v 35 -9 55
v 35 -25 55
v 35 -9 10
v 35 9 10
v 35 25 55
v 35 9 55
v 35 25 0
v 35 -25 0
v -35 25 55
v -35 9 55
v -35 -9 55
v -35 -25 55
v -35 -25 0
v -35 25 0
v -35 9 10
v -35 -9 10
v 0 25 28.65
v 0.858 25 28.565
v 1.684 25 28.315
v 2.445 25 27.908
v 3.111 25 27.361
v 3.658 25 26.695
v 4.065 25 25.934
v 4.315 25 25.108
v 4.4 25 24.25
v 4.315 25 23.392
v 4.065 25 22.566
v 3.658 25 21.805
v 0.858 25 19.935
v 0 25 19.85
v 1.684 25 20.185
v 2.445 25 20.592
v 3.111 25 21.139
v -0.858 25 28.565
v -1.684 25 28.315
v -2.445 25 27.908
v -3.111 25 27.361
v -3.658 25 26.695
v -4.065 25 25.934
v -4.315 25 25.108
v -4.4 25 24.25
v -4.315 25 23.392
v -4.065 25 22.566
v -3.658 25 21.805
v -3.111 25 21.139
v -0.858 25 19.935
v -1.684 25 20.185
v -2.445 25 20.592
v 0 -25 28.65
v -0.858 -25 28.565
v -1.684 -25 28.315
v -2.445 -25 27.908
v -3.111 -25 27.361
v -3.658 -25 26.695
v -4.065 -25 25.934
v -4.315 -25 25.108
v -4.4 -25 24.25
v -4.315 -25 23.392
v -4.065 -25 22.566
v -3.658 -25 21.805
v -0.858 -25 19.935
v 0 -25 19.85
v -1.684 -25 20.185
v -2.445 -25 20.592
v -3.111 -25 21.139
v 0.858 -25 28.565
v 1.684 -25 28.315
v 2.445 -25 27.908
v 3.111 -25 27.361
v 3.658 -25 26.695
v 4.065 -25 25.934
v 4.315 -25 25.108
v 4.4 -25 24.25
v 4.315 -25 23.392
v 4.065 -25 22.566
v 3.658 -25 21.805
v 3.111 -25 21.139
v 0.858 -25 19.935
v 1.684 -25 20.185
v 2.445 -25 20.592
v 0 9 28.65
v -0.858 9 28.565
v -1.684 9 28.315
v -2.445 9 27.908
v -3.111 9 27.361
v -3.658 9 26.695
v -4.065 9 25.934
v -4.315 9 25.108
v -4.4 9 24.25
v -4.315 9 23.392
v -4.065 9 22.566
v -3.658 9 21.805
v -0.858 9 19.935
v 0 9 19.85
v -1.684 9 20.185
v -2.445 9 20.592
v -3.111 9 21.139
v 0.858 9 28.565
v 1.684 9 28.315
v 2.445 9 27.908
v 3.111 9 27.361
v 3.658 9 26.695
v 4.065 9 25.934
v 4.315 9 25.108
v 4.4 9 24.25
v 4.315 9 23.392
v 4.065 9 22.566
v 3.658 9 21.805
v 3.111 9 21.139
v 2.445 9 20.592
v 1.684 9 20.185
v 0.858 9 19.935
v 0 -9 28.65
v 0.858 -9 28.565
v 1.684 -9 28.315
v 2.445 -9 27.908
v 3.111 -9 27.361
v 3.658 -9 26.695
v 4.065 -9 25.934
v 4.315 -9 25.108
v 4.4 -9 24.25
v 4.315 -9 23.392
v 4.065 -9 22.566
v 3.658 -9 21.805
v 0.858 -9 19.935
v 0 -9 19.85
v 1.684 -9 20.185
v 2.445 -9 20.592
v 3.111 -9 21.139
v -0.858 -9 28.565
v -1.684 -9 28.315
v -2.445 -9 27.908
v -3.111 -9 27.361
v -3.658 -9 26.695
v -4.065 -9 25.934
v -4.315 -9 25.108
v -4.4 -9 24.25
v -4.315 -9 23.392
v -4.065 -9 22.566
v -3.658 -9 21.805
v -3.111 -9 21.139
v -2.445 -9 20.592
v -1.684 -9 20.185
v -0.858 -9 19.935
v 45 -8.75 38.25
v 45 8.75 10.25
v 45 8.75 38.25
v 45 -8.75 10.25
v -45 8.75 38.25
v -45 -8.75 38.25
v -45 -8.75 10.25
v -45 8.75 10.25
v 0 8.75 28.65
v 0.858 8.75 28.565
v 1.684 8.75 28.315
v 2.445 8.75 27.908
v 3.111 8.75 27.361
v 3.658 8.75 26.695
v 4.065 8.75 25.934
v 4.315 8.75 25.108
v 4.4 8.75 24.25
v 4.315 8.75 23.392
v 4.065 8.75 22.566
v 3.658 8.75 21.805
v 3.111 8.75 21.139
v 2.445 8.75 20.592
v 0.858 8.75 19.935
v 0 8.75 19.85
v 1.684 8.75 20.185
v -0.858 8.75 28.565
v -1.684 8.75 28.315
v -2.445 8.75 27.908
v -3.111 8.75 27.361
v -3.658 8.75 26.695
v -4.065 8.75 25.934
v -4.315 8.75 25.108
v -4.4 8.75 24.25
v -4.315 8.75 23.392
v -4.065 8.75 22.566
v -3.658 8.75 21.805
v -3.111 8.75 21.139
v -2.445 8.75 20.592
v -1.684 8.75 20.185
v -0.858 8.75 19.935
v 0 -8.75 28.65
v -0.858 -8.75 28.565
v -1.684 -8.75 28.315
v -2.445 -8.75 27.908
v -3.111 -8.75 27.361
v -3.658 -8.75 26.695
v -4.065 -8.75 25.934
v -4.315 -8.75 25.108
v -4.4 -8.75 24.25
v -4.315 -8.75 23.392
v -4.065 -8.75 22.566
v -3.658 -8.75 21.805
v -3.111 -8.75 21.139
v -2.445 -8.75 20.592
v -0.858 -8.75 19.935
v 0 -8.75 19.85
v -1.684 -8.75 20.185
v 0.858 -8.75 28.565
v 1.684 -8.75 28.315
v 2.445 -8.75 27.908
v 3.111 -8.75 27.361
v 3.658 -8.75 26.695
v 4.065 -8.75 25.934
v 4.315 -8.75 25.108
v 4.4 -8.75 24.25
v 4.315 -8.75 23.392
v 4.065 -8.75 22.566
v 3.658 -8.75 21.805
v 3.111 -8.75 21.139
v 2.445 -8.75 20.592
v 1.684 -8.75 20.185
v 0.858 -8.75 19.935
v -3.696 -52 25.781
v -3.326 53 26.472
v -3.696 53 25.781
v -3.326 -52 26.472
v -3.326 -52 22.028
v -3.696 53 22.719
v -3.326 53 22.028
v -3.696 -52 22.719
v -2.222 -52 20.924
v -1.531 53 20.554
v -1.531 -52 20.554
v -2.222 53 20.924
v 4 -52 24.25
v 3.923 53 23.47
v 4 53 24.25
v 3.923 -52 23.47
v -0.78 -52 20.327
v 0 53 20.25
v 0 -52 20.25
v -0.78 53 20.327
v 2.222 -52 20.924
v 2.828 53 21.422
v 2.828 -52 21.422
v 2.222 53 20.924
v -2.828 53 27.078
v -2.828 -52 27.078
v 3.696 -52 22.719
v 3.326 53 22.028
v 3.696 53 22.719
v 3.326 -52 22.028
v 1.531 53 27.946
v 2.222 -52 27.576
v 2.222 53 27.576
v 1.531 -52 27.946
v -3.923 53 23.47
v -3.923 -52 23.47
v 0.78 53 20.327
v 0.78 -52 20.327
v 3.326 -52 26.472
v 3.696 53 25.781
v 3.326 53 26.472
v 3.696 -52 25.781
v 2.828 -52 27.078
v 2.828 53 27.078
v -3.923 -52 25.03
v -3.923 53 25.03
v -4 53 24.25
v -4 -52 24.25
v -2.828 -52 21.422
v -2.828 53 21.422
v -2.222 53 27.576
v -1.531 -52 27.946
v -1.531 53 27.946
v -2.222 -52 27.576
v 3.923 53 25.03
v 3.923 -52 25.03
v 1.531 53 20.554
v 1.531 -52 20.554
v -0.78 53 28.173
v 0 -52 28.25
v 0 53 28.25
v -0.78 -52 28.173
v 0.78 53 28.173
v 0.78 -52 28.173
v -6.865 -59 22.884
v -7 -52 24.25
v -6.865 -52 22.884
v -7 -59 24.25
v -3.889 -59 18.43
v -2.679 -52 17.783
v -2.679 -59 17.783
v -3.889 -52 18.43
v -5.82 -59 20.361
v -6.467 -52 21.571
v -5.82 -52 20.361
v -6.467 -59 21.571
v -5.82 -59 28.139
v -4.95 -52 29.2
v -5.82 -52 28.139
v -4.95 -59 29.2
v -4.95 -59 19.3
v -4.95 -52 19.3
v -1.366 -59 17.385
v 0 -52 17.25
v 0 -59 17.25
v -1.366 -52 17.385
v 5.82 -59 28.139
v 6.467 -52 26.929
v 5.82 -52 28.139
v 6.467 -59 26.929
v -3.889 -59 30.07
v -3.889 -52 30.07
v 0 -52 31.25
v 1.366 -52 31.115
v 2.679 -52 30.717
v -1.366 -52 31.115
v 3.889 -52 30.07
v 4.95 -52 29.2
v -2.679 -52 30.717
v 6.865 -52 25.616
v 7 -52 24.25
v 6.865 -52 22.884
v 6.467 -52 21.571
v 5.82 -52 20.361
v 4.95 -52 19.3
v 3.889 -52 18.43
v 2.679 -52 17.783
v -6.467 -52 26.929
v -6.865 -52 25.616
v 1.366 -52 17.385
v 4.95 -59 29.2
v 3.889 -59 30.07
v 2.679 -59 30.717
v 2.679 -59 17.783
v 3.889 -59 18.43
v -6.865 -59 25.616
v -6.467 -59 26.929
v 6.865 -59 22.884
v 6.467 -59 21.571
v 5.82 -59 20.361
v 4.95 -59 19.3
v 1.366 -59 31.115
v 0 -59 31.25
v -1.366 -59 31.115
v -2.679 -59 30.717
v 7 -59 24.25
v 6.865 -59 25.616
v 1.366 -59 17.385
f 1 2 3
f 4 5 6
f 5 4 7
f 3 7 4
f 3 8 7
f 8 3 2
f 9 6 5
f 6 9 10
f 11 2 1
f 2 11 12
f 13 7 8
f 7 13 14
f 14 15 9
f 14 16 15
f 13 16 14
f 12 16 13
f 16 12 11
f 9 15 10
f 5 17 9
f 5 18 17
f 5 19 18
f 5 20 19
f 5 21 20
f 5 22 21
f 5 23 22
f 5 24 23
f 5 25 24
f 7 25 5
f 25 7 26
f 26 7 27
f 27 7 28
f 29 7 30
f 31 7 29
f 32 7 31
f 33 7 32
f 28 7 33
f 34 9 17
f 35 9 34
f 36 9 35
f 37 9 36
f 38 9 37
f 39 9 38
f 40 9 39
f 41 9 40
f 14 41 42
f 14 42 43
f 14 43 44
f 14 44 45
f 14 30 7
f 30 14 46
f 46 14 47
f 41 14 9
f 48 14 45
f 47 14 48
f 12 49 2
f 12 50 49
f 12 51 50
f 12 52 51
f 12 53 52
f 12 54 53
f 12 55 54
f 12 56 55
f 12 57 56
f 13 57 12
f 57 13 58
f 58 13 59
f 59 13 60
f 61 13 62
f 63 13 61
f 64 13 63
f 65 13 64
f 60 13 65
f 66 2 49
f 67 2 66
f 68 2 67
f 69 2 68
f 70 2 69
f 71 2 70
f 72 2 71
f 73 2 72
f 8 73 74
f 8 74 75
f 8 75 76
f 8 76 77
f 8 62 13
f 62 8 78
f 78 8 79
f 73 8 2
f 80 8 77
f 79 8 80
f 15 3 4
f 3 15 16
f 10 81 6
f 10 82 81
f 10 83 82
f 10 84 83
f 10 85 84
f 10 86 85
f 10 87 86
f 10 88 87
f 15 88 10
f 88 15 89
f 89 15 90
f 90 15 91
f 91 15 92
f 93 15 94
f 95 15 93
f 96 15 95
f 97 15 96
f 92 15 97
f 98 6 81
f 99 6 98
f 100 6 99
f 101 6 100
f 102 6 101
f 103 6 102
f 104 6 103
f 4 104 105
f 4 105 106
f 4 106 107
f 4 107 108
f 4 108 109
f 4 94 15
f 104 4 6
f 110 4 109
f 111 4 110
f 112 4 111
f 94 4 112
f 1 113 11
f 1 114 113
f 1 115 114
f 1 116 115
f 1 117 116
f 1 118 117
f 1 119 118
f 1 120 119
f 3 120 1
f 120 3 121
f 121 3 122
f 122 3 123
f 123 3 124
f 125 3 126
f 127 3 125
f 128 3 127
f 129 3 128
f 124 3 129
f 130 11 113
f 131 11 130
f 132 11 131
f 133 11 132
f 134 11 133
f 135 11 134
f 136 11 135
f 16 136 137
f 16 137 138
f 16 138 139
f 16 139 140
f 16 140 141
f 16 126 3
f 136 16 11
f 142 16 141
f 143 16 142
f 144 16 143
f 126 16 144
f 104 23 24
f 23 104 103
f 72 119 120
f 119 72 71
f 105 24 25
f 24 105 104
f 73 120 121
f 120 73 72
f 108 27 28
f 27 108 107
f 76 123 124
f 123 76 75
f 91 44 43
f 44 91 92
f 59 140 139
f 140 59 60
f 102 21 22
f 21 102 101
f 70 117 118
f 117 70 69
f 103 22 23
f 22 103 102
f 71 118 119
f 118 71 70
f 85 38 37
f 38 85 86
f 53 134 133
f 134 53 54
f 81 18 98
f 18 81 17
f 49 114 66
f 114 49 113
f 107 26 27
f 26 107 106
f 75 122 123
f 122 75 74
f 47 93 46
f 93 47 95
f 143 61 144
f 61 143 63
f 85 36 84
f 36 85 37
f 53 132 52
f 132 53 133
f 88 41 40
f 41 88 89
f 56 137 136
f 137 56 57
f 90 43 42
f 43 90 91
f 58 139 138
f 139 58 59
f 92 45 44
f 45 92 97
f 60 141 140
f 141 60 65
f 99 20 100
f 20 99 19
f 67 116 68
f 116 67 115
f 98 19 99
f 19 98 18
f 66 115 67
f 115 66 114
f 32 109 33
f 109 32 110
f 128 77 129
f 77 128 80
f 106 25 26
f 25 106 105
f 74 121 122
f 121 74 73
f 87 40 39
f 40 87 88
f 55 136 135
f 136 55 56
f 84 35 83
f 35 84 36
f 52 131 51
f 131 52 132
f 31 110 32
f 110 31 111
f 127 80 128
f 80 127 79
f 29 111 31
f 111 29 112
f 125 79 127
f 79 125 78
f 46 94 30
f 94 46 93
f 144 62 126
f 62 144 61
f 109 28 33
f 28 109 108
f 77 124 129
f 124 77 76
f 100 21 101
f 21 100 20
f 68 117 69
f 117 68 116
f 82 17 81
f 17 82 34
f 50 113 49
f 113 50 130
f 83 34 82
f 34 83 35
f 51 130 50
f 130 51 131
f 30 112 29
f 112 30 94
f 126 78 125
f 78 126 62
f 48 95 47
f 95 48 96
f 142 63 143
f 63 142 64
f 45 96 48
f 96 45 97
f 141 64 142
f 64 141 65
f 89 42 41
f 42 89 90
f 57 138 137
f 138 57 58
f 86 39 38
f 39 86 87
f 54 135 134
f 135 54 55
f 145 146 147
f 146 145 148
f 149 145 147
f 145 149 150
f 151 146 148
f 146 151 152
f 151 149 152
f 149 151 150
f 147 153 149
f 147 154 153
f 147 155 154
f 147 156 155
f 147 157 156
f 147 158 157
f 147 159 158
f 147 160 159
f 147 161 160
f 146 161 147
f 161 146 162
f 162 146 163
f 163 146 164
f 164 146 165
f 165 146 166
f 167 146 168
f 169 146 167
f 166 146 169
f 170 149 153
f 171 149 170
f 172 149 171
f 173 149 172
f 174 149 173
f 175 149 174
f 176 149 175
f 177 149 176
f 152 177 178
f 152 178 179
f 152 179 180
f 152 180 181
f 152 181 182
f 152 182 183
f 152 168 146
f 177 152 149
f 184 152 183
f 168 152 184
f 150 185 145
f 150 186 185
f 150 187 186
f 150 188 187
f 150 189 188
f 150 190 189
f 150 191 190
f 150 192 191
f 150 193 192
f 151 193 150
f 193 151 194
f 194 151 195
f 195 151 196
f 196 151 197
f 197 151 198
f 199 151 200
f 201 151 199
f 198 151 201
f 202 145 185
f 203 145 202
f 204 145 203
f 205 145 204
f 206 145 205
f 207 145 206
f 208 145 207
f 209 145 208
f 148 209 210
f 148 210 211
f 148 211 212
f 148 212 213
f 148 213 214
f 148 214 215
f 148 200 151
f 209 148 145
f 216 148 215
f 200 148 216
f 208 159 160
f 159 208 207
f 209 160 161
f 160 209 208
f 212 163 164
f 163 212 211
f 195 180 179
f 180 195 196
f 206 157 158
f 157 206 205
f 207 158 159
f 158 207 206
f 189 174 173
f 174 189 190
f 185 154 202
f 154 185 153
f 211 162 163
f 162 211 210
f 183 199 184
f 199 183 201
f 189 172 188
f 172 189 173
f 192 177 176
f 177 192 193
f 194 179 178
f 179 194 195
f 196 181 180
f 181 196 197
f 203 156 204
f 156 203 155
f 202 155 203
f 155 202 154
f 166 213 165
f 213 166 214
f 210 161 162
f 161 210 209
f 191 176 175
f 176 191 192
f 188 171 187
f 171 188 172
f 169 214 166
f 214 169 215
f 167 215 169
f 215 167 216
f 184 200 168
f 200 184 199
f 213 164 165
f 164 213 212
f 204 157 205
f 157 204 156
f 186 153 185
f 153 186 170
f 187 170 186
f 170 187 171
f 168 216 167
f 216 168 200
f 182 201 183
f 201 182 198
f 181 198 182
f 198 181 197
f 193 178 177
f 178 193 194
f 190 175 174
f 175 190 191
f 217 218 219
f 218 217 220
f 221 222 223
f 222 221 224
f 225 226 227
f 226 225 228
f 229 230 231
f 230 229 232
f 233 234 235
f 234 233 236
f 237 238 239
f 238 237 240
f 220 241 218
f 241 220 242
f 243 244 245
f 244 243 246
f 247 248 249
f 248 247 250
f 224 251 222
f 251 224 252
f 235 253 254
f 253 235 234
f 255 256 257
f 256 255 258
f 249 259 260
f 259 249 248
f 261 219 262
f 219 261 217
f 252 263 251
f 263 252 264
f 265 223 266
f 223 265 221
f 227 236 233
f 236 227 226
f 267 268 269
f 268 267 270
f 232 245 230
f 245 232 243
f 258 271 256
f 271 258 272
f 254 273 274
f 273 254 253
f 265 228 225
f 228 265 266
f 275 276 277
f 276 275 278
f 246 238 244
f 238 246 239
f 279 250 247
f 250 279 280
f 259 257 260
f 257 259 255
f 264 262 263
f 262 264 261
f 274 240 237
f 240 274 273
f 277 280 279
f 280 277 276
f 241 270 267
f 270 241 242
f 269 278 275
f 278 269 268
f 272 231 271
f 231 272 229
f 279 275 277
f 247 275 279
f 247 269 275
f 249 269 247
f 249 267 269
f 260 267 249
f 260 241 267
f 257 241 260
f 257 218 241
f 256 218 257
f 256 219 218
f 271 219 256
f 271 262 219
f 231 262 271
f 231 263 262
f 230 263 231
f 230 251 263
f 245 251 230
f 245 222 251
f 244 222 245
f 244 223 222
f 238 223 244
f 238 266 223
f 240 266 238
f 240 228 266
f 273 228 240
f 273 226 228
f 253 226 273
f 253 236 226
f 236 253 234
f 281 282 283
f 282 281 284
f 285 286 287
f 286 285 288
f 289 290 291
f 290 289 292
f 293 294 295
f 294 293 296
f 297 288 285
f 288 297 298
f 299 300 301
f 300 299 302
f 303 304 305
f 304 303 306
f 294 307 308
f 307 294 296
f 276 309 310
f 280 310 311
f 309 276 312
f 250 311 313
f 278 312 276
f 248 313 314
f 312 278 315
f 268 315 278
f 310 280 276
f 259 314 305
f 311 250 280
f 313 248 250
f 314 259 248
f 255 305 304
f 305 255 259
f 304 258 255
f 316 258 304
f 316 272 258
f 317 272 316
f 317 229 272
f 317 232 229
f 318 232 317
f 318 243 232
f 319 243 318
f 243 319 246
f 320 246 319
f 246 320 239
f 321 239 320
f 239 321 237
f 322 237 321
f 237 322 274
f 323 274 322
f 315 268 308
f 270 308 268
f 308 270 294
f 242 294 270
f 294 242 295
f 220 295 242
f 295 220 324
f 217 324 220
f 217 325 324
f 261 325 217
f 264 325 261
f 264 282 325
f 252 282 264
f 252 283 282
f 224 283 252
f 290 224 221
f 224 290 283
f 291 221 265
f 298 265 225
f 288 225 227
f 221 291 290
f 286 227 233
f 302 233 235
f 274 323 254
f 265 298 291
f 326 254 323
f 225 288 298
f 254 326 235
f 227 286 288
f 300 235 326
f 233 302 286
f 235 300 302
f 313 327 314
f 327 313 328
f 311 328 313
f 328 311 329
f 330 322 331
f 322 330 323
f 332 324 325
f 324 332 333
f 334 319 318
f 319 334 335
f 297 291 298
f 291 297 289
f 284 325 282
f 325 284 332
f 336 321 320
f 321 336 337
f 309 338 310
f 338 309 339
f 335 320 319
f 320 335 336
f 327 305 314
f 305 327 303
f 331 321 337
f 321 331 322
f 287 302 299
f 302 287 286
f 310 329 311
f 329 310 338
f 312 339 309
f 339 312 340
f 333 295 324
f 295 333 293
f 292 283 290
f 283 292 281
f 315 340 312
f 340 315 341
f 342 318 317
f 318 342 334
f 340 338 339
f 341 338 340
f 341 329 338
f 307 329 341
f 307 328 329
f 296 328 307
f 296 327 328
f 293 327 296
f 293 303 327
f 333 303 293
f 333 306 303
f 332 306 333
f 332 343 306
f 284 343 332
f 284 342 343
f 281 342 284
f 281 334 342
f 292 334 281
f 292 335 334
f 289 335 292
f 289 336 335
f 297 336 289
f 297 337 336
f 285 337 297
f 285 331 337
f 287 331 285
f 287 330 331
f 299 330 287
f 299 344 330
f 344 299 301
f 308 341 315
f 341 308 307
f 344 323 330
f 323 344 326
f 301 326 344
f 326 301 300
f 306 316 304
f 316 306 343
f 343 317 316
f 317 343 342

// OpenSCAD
$fn = 32;

// ------------------------------------------------------------------------
// Clevis joint: 70 mm clevis, pin d8
// Every part is its own module, assembly() places them once.
// ------------------------------------------------------------------------

// --- part 1 ---
module clevis() {
  difference() {
    translate([-35, -25, 0]) cube([70, 50, 55]);
    translate([-36, -9, 10]) cube([72, 18, 46]);
    translate([0, 0, 24.25]) rotate([90, 0, 0]) cylinder(h = 52, d = 8.8, center = true);
  }
}

// --- part 2 ---
module eye() {
  difference() {
    translate([-45, -8.75, 0]) cube([90, 17.5, 28]);
    translate([0, 0, 14]) rotate([90, 0, 0]) cylinder(h = 19.5, d = 8.8, center = true);
  }
}

// --- part 3 ---
module pin() {
  rotate([0, 90, 0]) cylinder(h = 106, d = 8, center = true);
  translate([-59, 0, 0]) rotate([0, 90, 0]) cylinder(h = 7, d = 14);
}

// --- assembly ---
module assembly() {
  translate([0, 0, 0]) rotate([0, 0, 0]) clevis();
  translate([0, 0, 10.25]) rotate([0, 0, 0]) eye();
  translate([0, 0, 24.25]) rotate([0, 0, 90]) pin();
}

assembly();
